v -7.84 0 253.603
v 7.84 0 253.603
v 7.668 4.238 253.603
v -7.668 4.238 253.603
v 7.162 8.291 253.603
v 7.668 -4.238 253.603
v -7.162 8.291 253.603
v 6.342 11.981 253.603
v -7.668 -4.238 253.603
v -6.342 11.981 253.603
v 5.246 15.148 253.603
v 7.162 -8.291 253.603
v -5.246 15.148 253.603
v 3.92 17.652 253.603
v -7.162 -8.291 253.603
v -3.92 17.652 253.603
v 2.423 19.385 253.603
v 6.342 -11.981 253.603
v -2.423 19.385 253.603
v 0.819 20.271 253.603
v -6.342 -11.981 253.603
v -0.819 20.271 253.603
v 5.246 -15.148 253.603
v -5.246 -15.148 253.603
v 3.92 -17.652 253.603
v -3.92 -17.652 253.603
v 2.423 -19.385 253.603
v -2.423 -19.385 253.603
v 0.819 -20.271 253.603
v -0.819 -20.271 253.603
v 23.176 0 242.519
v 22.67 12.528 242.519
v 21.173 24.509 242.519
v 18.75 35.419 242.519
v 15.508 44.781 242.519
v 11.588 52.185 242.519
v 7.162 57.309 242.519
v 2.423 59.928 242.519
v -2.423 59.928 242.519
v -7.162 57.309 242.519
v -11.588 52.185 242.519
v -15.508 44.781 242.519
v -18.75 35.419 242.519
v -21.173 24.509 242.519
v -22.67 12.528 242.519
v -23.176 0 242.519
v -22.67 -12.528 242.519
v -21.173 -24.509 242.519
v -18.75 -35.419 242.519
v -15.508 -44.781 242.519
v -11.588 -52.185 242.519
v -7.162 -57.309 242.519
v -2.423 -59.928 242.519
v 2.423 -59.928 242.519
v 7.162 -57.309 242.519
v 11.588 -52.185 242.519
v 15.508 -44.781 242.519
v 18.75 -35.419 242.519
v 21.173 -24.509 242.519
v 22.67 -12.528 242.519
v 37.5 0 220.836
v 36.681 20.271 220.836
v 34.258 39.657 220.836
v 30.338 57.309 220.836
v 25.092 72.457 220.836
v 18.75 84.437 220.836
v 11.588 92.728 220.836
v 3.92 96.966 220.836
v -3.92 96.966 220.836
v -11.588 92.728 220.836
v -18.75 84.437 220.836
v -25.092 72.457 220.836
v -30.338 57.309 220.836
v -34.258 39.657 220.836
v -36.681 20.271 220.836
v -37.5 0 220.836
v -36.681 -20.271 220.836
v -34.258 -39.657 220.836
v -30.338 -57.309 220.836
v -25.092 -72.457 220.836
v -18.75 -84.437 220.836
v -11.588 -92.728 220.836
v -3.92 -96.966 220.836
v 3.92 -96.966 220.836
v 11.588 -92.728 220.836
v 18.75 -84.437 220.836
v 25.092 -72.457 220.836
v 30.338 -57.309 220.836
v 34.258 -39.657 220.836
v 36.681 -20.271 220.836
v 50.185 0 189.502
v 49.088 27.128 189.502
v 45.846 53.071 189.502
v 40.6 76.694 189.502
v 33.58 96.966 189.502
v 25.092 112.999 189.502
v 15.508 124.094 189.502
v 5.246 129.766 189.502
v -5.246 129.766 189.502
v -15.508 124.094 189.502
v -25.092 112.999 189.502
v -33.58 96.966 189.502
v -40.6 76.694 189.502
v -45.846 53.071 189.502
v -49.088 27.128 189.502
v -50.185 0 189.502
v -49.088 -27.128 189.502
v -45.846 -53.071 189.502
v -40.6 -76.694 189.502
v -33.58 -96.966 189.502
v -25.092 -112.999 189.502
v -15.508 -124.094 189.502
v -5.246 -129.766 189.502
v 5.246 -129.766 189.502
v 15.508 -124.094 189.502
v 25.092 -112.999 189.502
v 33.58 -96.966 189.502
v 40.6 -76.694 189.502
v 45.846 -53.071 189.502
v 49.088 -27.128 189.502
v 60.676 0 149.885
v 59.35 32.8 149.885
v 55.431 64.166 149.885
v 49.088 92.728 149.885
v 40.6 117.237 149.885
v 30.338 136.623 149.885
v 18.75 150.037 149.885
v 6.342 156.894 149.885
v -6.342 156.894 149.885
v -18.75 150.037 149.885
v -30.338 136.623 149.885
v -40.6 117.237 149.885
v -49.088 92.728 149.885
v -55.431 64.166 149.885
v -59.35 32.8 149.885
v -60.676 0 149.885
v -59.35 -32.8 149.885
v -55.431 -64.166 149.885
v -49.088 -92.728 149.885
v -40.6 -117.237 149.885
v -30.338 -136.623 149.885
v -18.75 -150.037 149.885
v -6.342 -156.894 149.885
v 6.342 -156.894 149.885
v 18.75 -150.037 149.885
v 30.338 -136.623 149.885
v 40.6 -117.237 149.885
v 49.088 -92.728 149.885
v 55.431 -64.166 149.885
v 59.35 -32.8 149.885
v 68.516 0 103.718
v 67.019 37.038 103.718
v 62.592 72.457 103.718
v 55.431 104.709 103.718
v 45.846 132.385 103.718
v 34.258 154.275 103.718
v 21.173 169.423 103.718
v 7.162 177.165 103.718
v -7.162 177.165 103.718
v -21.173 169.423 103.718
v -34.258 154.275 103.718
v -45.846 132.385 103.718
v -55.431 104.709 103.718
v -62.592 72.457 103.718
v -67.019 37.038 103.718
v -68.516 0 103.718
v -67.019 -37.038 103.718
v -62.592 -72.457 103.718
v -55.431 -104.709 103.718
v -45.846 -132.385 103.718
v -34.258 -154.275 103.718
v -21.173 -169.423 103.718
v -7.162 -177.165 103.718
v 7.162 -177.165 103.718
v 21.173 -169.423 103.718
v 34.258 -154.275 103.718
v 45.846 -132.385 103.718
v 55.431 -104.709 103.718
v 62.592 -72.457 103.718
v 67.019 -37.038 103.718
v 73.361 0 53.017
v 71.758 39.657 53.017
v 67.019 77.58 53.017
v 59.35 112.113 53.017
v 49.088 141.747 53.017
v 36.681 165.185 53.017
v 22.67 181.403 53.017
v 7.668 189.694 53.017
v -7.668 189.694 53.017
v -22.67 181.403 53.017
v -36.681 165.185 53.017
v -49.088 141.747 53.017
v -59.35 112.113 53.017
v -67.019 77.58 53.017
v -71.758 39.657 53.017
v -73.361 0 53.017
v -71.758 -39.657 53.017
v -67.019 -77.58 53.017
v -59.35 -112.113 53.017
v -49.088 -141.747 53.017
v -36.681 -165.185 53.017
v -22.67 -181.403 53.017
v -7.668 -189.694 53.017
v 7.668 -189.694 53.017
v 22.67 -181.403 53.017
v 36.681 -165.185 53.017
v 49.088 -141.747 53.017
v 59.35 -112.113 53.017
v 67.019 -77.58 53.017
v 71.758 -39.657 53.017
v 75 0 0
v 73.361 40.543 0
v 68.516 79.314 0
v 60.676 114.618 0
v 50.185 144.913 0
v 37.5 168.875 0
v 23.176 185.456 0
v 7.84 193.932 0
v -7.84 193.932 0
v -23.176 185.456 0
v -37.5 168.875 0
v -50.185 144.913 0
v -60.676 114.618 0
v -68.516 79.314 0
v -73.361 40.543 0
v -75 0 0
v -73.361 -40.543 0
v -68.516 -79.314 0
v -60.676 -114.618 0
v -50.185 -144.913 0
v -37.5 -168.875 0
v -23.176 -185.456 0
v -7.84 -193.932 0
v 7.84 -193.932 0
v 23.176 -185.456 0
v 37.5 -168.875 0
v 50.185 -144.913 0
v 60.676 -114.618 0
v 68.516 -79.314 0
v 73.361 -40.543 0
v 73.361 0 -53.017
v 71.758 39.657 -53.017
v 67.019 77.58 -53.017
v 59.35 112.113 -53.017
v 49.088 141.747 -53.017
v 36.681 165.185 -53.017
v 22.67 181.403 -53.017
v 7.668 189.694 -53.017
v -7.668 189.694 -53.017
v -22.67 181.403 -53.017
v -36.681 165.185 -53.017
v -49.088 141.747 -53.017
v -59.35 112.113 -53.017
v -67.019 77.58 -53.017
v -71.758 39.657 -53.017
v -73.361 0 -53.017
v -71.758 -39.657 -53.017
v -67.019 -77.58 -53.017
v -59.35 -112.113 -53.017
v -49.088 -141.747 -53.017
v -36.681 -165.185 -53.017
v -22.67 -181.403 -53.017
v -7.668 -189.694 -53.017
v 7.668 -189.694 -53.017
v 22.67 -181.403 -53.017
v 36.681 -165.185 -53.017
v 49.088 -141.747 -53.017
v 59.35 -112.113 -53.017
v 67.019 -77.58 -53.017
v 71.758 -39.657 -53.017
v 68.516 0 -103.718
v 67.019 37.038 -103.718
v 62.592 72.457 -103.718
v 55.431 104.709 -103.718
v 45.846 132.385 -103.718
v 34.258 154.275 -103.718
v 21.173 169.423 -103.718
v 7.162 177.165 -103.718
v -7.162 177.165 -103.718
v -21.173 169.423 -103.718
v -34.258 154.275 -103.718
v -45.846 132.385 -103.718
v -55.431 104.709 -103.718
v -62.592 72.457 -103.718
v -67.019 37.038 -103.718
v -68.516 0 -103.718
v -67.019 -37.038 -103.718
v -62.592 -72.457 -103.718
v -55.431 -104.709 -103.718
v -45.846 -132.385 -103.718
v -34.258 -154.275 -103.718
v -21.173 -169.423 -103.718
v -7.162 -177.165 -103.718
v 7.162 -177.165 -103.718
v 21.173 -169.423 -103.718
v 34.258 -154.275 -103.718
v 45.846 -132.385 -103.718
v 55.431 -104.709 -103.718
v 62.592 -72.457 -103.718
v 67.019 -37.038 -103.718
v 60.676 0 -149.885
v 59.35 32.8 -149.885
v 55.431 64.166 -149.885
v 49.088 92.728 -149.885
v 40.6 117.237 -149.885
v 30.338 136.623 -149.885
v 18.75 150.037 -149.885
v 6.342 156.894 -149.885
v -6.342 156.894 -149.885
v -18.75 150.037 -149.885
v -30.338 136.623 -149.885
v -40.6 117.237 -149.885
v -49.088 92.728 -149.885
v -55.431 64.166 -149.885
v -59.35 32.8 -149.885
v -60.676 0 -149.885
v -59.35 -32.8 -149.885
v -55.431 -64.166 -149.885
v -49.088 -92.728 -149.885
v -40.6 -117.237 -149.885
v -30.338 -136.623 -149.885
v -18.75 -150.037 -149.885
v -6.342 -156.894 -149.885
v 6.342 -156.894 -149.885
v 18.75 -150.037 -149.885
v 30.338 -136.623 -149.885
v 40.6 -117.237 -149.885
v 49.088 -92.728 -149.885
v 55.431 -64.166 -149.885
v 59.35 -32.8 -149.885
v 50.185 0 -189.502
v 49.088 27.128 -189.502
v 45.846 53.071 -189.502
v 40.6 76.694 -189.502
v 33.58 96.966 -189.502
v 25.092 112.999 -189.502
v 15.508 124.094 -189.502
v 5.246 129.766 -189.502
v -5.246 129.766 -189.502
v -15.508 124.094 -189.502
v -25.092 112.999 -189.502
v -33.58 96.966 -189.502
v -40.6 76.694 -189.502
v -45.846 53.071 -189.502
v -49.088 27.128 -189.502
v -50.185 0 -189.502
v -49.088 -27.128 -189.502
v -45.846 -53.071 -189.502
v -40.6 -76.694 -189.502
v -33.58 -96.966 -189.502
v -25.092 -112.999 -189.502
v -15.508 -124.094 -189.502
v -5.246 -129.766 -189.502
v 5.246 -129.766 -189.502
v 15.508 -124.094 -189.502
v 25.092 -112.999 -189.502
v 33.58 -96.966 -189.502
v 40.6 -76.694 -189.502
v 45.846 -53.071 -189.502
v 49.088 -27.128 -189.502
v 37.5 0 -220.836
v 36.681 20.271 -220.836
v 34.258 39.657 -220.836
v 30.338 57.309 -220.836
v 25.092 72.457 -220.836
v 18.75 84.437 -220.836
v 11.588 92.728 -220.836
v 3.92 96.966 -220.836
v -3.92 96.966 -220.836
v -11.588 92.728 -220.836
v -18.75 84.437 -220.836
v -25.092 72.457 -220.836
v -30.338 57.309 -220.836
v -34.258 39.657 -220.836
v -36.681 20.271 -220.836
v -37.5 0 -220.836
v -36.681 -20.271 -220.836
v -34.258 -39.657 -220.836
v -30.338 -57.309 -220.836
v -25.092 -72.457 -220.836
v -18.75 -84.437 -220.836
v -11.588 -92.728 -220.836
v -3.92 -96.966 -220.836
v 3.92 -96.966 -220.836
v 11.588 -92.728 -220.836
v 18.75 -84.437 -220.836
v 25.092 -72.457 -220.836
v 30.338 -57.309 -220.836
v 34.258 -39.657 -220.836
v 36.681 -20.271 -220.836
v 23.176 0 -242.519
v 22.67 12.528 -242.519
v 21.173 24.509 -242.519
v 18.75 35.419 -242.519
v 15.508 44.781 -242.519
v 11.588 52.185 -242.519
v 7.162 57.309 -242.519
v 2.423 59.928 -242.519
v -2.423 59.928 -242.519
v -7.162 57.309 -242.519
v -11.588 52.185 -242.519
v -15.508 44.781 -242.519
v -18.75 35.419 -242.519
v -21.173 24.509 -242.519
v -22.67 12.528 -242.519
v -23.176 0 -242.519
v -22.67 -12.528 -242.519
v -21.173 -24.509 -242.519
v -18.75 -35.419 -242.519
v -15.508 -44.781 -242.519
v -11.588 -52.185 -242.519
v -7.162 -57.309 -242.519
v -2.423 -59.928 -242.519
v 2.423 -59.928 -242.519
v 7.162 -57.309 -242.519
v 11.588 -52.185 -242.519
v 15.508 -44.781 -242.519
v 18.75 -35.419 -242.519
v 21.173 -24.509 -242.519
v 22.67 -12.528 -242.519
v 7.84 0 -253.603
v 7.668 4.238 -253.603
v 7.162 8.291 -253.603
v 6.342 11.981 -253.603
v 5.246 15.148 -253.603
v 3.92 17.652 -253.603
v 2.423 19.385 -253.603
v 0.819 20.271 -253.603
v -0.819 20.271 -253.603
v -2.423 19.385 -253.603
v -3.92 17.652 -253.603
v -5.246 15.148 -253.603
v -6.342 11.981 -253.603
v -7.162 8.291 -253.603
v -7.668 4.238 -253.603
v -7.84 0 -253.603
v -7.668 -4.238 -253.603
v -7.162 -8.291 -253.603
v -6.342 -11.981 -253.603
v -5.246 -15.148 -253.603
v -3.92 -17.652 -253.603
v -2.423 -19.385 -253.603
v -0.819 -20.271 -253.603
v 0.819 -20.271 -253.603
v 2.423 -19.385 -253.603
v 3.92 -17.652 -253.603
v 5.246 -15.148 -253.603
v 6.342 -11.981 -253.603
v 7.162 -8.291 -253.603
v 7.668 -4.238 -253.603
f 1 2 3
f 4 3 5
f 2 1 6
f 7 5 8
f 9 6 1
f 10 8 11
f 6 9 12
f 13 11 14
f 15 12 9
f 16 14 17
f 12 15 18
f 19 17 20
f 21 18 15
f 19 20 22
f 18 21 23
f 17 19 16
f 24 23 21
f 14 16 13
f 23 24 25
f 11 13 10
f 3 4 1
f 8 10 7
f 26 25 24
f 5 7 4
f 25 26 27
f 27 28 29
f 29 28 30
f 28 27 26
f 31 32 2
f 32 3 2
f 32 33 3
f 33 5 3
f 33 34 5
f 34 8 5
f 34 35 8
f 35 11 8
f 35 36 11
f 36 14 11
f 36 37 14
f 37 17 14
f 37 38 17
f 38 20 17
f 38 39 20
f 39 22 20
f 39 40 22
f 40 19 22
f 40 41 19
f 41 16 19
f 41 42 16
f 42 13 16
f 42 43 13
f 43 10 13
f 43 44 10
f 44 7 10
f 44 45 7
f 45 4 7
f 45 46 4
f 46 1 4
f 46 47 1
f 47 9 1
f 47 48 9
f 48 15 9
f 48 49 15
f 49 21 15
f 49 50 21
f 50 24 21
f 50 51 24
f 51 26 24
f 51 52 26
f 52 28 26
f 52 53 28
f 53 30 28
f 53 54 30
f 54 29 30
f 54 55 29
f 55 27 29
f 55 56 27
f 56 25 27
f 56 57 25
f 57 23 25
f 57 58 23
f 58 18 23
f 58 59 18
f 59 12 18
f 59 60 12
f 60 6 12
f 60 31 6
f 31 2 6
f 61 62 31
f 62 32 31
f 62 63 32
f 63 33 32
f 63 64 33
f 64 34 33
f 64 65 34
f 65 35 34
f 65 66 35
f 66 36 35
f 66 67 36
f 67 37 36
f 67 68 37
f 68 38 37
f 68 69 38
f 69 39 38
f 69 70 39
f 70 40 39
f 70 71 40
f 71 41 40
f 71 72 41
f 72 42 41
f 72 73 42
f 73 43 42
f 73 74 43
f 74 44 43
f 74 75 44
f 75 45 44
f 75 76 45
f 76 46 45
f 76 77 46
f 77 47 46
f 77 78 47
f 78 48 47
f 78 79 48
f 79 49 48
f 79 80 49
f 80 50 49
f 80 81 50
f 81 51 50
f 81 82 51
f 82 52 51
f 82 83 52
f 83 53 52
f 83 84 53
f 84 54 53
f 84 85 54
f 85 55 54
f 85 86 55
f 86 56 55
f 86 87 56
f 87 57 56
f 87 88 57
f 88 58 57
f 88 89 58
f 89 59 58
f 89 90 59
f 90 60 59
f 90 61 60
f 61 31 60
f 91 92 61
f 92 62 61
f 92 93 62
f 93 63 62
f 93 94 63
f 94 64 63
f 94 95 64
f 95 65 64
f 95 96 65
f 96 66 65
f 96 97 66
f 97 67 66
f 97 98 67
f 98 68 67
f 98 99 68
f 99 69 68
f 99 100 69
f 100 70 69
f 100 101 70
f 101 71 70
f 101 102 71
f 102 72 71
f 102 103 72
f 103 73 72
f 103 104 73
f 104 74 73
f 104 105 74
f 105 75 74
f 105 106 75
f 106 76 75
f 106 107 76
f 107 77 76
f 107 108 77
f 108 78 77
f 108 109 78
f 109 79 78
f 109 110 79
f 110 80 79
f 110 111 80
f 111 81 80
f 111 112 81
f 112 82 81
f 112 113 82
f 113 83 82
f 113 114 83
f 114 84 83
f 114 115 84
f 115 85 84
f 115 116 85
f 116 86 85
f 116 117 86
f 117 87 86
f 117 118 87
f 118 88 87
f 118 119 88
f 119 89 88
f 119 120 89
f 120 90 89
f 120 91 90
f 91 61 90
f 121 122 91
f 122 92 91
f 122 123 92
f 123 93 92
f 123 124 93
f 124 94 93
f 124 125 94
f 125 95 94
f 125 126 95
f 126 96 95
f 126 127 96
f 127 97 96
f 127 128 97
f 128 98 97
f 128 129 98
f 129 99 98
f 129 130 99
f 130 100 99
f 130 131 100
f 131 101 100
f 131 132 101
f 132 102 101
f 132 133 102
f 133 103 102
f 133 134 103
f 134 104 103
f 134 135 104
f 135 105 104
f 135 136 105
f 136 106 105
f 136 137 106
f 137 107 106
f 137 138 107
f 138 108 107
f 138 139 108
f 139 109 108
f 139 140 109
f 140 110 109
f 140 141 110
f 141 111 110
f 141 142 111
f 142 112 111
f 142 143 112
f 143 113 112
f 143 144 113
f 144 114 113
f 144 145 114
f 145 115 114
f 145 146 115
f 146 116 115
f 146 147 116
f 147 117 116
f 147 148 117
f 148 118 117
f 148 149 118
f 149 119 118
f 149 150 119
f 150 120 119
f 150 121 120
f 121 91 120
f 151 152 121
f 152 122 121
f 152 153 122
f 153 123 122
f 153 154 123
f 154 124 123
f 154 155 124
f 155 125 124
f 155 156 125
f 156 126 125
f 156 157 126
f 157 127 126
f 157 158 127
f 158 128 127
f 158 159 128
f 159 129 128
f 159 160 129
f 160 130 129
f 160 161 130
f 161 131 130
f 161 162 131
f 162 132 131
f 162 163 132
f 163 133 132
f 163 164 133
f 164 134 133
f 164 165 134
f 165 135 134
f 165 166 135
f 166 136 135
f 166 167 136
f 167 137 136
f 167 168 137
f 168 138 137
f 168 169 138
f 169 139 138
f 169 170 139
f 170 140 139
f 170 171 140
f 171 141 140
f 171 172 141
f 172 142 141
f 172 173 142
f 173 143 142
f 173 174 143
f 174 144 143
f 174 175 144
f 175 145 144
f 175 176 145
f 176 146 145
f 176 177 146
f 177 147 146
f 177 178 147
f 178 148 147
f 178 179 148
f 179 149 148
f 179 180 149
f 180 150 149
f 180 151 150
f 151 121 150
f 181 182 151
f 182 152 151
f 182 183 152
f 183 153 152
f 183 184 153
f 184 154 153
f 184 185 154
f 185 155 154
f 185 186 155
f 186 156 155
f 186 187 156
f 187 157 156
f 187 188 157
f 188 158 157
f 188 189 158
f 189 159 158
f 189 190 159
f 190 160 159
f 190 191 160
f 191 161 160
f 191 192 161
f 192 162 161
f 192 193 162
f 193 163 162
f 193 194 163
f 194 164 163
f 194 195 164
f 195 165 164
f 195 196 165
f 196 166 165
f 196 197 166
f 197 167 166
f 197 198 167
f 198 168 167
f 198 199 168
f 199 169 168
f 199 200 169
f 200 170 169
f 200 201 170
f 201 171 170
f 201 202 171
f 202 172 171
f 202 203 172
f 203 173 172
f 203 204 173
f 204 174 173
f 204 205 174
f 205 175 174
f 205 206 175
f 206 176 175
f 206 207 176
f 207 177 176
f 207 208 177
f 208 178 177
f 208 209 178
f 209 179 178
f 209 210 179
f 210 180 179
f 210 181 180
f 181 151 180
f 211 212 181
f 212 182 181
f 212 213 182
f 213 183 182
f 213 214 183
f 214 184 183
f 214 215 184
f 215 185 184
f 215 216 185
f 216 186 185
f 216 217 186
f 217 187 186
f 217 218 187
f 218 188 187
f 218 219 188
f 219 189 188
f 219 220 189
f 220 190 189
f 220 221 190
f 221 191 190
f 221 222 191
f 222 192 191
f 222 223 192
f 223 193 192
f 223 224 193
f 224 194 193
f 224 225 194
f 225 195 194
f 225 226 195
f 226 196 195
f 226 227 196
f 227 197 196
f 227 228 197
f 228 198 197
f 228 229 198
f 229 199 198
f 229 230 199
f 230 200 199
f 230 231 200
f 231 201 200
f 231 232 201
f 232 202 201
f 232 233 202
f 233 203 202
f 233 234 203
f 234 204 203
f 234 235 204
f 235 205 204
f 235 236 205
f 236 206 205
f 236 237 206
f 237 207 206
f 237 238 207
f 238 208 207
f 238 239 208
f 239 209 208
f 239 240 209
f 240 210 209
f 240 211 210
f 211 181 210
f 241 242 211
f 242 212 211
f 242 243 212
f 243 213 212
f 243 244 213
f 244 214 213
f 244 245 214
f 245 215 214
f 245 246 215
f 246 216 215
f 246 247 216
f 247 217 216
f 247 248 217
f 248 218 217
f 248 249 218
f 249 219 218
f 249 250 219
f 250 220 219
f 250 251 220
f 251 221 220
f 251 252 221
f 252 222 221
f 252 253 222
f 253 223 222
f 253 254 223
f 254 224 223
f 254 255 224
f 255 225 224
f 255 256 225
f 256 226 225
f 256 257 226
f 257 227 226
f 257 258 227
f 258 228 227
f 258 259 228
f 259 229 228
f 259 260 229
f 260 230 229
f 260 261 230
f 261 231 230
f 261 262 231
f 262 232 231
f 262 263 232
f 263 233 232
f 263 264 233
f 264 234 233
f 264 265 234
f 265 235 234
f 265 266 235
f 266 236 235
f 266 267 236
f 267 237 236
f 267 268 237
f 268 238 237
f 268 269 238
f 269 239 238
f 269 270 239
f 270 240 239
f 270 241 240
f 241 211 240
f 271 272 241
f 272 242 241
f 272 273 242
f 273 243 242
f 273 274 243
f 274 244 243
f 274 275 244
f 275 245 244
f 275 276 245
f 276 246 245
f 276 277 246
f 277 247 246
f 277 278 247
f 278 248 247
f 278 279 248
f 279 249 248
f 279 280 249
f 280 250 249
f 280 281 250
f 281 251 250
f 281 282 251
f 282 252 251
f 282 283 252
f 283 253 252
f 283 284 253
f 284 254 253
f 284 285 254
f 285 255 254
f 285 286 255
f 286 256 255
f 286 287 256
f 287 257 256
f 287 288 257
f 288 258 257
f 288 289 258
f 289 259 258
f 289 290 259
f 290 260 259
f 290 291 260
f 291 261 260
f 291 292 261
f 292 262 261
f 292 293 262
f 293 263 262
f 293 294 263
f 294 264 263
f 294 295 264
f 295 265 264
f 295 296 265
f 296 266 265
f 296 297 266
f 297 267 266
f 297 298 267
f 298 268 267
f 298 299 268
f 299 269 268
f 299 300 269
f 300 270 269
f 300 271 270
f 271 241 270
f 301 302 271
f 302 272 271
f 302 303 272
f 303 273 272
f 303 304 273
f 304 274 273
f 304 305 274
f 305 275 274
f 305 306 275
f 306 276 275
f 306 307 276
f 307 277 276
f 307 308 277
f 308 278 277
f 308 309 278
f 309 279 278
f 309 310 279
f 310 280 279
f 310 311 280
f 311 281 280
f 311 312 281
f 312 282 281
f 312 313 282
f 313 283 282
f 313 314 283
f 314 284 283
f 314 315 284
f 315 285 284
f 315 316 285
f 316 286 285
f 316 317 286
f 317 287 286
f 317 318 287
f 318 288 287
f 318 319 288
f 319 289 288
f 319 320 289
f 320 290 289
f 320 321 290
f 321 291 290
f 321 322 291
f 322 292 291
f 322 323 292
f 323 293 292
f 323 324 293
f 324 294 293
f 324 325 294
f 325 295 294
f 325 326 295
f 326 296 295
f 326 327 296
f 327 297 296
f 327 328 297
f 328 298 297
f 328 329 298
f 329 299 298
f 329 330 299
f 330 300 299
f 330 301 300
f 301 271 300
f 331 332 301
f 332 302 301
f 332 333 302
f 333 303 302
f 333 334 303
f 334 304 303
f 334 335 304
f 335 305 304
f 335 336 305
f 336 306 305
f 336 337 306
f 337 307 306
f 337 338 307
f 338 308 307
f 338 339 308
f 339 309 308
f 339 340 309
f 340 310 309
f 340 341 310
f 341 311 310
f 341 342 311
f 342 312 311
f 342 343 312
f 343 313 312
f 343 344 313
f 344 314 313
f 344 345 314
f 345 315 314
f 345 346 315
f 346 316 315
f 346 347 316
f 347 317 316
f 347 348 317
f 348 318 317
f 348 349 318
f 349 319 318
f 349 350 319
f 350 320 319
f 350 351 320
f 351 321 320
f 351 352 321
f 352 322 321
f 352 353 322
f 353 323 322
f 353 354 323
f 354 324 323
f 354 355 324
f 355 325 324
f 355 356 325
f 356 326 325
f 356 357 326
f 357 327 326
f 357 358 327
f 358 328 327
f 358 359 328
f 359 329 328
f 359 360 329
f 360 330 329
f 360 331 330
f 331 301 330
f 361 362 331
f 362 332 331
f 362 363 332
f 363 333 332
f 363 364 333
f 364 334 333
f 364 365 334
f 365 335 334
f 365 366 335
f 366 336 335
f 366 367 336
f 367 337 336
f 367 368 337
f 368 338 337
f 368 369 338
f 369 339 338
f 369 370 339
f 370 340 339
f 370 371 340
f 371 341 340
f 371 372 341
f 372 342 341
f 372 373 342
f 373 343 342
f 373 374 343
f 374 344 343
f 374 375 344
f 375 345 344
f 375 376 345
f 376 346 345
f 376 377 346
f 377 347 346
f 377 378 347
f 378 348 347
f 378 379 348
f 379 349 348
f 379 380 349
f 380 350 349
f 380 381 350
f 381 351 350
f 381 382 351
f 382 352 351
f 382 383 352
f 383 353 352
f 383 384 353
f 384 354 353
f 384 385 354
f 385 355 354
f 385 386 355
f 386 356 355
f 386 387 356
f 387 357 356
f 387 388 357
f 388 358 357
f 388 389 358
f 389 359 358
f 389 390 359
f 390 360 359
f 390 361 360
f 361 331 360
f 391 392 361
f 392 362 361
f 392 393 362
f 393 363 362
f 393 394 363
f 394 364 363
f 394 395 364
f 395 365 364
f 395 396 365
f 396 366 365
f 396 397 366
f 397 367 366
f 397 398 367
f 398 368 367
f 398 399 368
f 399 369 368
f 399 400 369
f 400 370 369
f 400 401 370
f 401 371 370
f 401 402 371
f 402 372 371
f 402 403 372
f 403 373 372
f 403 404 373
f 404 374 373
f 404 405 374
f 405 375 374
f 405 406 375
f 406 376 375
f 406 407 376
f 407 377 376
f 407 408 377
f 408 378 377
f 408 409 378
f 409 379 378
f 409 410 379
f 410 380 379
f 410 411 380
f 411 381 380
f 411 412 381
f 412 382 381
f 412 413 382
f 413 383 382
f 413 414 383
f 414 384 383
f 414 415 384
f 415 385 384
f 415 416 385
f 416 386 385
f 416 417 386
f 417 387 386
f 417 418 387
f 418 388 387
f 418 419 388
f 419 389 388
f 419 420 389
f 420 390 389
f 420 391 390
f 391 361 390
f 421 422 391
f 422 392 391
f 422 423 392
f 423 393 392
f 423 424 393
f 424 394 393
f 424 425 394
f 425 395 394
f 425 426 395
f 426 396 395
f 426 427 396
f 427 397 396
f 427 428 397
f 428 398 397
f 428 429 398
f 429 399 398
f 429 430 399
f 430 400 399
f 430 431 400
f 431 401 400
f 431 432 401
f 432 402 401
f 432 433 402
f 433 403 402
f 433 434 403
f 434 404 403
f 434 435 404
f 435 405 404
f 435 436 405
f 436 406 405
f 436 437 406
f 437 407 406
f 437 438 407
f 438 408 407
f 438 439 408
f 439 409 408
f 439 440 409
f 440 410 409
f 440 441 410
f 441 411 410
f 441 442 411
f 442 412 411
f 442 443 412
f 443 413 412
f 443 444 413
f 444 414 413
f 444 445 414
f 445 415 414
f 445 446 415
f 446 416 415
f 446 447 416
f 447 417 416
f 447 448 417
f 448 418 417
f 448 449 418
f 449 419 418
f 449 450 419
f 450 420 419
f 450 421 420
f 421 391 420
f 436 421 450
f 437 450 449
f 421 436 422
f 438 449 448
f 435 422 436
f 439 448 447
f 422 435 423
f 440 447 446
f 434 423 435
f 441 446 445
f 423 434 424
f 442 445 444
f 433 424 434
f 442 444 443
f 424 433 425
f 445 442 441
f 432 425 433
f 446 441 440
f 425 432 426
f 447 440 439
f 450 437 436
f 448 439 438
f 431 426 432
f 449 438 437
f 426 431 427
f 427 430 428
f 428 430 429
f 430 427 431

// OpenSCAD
// Generated by SolidPython 1.0.1 on 2020-07-29 00:46:46


scale(v = [5, 13, 17]) {
	sphere(r = 15);
}
/***********************************************
*********      SolidPython code:      **********
************************************************
 
# import packages: SolidPython
from solid import *
from solid.utils import *
from itertools import chain, combinations, permutations


class Resize:

    def __init__(self, scad_file):
        self.scad_file = scad_file
        #self.scad_file = import_scad(scad_file)
        # cone/cylinder param:
        self.r1 = 0
        self.r2 = 0
        self.h = 0
        # rectangular prism param:
        self.w = 0
        self.l = 0
        # ellipse param:
        self.r = 0

    # import OpenScad code (file name corresponds to shape)


    # classify shape + parameters
    def assign(self, param1, param2, param3):
        if self.scad_file == 'cone.scad':
            self.r1 = param1
            self.r2 = param2
            self.h = param3
        elif self.scad_file == 'cylinder.scad':
            self.r1 = param1
            self.r2 = param2
            self.h = param3
        elif self.scad_file == 'rectangularPrism.scad':
            self.h = param1
            self.l = param2
            self.w = param3
        else:
            self.r = param1
            self.h = param2

    # resize parameters
    def iterate(self):
        x = range(3, 20, 2)
        i = 1
        if self.scad_file == 'cone.scad':
            tempList = list(permutations(x, 2))
            for temp in tempList:
                param1 = temp[0]
                param2 = temp[1]
                filepath = 'produced_scad_files/' + 'cone' + str(param1) + '_' + str(param2) + '_' + '.scad'
                scad_render_to_file(cylinder(h=param1, r1=param2, r2=0), filepath)

        elif self.scad_file == 'cylinder.scad':
            tempList = list(permutations(x, 3))
            for temp in tempList:
                param1 = temp[0]
                param2 = temp[1]
                filepath = 'produced_scad_files/' + 'cylinder' + str(param1) + '_' + str(param2) + '_' + '.scad'
                scad_render_to_file(cylinder(h=param1, r1=param2, r2=param2), filepath)

        elif self.scad_file == 'rectangularPrism.scad':
            tempList = list(permutations(x, 3))
            for temp in tempList:
                param1 = temp[0]
                param2 = temp[1]
                param3 = temp[2]
                filepath = 'produced_scad_files/' + 'rectangularPrism' + str(param1) + '_' + str(param2) + '_' + str(
                    param3) + '.scad'
                scad_render_to_file(cube(size=(param1, param2, param3)), filepath)

        elif self.scad_file == 'ellipse.scad':
            tempList = list(permutations(x, 4))
            for temp in tempList:
                param1 = temp[0]
                param2 = temp[1]
                param3 = temp[2]
                param4 = temp[3]
                filepath = 'produced_scad_files/' + 'ellipse' + str(param1) + '_' + str(param2) + '_' + str(param3) + '_' + str(param4) + '.scad'
                scad_render_to_file(scale([param1, param2, param3])(sphere(r=param4)), filepath)

    def render_to_scadfile(self):
        scad_render_to_file(scad, 'example.scad') 
 
************************************************/
